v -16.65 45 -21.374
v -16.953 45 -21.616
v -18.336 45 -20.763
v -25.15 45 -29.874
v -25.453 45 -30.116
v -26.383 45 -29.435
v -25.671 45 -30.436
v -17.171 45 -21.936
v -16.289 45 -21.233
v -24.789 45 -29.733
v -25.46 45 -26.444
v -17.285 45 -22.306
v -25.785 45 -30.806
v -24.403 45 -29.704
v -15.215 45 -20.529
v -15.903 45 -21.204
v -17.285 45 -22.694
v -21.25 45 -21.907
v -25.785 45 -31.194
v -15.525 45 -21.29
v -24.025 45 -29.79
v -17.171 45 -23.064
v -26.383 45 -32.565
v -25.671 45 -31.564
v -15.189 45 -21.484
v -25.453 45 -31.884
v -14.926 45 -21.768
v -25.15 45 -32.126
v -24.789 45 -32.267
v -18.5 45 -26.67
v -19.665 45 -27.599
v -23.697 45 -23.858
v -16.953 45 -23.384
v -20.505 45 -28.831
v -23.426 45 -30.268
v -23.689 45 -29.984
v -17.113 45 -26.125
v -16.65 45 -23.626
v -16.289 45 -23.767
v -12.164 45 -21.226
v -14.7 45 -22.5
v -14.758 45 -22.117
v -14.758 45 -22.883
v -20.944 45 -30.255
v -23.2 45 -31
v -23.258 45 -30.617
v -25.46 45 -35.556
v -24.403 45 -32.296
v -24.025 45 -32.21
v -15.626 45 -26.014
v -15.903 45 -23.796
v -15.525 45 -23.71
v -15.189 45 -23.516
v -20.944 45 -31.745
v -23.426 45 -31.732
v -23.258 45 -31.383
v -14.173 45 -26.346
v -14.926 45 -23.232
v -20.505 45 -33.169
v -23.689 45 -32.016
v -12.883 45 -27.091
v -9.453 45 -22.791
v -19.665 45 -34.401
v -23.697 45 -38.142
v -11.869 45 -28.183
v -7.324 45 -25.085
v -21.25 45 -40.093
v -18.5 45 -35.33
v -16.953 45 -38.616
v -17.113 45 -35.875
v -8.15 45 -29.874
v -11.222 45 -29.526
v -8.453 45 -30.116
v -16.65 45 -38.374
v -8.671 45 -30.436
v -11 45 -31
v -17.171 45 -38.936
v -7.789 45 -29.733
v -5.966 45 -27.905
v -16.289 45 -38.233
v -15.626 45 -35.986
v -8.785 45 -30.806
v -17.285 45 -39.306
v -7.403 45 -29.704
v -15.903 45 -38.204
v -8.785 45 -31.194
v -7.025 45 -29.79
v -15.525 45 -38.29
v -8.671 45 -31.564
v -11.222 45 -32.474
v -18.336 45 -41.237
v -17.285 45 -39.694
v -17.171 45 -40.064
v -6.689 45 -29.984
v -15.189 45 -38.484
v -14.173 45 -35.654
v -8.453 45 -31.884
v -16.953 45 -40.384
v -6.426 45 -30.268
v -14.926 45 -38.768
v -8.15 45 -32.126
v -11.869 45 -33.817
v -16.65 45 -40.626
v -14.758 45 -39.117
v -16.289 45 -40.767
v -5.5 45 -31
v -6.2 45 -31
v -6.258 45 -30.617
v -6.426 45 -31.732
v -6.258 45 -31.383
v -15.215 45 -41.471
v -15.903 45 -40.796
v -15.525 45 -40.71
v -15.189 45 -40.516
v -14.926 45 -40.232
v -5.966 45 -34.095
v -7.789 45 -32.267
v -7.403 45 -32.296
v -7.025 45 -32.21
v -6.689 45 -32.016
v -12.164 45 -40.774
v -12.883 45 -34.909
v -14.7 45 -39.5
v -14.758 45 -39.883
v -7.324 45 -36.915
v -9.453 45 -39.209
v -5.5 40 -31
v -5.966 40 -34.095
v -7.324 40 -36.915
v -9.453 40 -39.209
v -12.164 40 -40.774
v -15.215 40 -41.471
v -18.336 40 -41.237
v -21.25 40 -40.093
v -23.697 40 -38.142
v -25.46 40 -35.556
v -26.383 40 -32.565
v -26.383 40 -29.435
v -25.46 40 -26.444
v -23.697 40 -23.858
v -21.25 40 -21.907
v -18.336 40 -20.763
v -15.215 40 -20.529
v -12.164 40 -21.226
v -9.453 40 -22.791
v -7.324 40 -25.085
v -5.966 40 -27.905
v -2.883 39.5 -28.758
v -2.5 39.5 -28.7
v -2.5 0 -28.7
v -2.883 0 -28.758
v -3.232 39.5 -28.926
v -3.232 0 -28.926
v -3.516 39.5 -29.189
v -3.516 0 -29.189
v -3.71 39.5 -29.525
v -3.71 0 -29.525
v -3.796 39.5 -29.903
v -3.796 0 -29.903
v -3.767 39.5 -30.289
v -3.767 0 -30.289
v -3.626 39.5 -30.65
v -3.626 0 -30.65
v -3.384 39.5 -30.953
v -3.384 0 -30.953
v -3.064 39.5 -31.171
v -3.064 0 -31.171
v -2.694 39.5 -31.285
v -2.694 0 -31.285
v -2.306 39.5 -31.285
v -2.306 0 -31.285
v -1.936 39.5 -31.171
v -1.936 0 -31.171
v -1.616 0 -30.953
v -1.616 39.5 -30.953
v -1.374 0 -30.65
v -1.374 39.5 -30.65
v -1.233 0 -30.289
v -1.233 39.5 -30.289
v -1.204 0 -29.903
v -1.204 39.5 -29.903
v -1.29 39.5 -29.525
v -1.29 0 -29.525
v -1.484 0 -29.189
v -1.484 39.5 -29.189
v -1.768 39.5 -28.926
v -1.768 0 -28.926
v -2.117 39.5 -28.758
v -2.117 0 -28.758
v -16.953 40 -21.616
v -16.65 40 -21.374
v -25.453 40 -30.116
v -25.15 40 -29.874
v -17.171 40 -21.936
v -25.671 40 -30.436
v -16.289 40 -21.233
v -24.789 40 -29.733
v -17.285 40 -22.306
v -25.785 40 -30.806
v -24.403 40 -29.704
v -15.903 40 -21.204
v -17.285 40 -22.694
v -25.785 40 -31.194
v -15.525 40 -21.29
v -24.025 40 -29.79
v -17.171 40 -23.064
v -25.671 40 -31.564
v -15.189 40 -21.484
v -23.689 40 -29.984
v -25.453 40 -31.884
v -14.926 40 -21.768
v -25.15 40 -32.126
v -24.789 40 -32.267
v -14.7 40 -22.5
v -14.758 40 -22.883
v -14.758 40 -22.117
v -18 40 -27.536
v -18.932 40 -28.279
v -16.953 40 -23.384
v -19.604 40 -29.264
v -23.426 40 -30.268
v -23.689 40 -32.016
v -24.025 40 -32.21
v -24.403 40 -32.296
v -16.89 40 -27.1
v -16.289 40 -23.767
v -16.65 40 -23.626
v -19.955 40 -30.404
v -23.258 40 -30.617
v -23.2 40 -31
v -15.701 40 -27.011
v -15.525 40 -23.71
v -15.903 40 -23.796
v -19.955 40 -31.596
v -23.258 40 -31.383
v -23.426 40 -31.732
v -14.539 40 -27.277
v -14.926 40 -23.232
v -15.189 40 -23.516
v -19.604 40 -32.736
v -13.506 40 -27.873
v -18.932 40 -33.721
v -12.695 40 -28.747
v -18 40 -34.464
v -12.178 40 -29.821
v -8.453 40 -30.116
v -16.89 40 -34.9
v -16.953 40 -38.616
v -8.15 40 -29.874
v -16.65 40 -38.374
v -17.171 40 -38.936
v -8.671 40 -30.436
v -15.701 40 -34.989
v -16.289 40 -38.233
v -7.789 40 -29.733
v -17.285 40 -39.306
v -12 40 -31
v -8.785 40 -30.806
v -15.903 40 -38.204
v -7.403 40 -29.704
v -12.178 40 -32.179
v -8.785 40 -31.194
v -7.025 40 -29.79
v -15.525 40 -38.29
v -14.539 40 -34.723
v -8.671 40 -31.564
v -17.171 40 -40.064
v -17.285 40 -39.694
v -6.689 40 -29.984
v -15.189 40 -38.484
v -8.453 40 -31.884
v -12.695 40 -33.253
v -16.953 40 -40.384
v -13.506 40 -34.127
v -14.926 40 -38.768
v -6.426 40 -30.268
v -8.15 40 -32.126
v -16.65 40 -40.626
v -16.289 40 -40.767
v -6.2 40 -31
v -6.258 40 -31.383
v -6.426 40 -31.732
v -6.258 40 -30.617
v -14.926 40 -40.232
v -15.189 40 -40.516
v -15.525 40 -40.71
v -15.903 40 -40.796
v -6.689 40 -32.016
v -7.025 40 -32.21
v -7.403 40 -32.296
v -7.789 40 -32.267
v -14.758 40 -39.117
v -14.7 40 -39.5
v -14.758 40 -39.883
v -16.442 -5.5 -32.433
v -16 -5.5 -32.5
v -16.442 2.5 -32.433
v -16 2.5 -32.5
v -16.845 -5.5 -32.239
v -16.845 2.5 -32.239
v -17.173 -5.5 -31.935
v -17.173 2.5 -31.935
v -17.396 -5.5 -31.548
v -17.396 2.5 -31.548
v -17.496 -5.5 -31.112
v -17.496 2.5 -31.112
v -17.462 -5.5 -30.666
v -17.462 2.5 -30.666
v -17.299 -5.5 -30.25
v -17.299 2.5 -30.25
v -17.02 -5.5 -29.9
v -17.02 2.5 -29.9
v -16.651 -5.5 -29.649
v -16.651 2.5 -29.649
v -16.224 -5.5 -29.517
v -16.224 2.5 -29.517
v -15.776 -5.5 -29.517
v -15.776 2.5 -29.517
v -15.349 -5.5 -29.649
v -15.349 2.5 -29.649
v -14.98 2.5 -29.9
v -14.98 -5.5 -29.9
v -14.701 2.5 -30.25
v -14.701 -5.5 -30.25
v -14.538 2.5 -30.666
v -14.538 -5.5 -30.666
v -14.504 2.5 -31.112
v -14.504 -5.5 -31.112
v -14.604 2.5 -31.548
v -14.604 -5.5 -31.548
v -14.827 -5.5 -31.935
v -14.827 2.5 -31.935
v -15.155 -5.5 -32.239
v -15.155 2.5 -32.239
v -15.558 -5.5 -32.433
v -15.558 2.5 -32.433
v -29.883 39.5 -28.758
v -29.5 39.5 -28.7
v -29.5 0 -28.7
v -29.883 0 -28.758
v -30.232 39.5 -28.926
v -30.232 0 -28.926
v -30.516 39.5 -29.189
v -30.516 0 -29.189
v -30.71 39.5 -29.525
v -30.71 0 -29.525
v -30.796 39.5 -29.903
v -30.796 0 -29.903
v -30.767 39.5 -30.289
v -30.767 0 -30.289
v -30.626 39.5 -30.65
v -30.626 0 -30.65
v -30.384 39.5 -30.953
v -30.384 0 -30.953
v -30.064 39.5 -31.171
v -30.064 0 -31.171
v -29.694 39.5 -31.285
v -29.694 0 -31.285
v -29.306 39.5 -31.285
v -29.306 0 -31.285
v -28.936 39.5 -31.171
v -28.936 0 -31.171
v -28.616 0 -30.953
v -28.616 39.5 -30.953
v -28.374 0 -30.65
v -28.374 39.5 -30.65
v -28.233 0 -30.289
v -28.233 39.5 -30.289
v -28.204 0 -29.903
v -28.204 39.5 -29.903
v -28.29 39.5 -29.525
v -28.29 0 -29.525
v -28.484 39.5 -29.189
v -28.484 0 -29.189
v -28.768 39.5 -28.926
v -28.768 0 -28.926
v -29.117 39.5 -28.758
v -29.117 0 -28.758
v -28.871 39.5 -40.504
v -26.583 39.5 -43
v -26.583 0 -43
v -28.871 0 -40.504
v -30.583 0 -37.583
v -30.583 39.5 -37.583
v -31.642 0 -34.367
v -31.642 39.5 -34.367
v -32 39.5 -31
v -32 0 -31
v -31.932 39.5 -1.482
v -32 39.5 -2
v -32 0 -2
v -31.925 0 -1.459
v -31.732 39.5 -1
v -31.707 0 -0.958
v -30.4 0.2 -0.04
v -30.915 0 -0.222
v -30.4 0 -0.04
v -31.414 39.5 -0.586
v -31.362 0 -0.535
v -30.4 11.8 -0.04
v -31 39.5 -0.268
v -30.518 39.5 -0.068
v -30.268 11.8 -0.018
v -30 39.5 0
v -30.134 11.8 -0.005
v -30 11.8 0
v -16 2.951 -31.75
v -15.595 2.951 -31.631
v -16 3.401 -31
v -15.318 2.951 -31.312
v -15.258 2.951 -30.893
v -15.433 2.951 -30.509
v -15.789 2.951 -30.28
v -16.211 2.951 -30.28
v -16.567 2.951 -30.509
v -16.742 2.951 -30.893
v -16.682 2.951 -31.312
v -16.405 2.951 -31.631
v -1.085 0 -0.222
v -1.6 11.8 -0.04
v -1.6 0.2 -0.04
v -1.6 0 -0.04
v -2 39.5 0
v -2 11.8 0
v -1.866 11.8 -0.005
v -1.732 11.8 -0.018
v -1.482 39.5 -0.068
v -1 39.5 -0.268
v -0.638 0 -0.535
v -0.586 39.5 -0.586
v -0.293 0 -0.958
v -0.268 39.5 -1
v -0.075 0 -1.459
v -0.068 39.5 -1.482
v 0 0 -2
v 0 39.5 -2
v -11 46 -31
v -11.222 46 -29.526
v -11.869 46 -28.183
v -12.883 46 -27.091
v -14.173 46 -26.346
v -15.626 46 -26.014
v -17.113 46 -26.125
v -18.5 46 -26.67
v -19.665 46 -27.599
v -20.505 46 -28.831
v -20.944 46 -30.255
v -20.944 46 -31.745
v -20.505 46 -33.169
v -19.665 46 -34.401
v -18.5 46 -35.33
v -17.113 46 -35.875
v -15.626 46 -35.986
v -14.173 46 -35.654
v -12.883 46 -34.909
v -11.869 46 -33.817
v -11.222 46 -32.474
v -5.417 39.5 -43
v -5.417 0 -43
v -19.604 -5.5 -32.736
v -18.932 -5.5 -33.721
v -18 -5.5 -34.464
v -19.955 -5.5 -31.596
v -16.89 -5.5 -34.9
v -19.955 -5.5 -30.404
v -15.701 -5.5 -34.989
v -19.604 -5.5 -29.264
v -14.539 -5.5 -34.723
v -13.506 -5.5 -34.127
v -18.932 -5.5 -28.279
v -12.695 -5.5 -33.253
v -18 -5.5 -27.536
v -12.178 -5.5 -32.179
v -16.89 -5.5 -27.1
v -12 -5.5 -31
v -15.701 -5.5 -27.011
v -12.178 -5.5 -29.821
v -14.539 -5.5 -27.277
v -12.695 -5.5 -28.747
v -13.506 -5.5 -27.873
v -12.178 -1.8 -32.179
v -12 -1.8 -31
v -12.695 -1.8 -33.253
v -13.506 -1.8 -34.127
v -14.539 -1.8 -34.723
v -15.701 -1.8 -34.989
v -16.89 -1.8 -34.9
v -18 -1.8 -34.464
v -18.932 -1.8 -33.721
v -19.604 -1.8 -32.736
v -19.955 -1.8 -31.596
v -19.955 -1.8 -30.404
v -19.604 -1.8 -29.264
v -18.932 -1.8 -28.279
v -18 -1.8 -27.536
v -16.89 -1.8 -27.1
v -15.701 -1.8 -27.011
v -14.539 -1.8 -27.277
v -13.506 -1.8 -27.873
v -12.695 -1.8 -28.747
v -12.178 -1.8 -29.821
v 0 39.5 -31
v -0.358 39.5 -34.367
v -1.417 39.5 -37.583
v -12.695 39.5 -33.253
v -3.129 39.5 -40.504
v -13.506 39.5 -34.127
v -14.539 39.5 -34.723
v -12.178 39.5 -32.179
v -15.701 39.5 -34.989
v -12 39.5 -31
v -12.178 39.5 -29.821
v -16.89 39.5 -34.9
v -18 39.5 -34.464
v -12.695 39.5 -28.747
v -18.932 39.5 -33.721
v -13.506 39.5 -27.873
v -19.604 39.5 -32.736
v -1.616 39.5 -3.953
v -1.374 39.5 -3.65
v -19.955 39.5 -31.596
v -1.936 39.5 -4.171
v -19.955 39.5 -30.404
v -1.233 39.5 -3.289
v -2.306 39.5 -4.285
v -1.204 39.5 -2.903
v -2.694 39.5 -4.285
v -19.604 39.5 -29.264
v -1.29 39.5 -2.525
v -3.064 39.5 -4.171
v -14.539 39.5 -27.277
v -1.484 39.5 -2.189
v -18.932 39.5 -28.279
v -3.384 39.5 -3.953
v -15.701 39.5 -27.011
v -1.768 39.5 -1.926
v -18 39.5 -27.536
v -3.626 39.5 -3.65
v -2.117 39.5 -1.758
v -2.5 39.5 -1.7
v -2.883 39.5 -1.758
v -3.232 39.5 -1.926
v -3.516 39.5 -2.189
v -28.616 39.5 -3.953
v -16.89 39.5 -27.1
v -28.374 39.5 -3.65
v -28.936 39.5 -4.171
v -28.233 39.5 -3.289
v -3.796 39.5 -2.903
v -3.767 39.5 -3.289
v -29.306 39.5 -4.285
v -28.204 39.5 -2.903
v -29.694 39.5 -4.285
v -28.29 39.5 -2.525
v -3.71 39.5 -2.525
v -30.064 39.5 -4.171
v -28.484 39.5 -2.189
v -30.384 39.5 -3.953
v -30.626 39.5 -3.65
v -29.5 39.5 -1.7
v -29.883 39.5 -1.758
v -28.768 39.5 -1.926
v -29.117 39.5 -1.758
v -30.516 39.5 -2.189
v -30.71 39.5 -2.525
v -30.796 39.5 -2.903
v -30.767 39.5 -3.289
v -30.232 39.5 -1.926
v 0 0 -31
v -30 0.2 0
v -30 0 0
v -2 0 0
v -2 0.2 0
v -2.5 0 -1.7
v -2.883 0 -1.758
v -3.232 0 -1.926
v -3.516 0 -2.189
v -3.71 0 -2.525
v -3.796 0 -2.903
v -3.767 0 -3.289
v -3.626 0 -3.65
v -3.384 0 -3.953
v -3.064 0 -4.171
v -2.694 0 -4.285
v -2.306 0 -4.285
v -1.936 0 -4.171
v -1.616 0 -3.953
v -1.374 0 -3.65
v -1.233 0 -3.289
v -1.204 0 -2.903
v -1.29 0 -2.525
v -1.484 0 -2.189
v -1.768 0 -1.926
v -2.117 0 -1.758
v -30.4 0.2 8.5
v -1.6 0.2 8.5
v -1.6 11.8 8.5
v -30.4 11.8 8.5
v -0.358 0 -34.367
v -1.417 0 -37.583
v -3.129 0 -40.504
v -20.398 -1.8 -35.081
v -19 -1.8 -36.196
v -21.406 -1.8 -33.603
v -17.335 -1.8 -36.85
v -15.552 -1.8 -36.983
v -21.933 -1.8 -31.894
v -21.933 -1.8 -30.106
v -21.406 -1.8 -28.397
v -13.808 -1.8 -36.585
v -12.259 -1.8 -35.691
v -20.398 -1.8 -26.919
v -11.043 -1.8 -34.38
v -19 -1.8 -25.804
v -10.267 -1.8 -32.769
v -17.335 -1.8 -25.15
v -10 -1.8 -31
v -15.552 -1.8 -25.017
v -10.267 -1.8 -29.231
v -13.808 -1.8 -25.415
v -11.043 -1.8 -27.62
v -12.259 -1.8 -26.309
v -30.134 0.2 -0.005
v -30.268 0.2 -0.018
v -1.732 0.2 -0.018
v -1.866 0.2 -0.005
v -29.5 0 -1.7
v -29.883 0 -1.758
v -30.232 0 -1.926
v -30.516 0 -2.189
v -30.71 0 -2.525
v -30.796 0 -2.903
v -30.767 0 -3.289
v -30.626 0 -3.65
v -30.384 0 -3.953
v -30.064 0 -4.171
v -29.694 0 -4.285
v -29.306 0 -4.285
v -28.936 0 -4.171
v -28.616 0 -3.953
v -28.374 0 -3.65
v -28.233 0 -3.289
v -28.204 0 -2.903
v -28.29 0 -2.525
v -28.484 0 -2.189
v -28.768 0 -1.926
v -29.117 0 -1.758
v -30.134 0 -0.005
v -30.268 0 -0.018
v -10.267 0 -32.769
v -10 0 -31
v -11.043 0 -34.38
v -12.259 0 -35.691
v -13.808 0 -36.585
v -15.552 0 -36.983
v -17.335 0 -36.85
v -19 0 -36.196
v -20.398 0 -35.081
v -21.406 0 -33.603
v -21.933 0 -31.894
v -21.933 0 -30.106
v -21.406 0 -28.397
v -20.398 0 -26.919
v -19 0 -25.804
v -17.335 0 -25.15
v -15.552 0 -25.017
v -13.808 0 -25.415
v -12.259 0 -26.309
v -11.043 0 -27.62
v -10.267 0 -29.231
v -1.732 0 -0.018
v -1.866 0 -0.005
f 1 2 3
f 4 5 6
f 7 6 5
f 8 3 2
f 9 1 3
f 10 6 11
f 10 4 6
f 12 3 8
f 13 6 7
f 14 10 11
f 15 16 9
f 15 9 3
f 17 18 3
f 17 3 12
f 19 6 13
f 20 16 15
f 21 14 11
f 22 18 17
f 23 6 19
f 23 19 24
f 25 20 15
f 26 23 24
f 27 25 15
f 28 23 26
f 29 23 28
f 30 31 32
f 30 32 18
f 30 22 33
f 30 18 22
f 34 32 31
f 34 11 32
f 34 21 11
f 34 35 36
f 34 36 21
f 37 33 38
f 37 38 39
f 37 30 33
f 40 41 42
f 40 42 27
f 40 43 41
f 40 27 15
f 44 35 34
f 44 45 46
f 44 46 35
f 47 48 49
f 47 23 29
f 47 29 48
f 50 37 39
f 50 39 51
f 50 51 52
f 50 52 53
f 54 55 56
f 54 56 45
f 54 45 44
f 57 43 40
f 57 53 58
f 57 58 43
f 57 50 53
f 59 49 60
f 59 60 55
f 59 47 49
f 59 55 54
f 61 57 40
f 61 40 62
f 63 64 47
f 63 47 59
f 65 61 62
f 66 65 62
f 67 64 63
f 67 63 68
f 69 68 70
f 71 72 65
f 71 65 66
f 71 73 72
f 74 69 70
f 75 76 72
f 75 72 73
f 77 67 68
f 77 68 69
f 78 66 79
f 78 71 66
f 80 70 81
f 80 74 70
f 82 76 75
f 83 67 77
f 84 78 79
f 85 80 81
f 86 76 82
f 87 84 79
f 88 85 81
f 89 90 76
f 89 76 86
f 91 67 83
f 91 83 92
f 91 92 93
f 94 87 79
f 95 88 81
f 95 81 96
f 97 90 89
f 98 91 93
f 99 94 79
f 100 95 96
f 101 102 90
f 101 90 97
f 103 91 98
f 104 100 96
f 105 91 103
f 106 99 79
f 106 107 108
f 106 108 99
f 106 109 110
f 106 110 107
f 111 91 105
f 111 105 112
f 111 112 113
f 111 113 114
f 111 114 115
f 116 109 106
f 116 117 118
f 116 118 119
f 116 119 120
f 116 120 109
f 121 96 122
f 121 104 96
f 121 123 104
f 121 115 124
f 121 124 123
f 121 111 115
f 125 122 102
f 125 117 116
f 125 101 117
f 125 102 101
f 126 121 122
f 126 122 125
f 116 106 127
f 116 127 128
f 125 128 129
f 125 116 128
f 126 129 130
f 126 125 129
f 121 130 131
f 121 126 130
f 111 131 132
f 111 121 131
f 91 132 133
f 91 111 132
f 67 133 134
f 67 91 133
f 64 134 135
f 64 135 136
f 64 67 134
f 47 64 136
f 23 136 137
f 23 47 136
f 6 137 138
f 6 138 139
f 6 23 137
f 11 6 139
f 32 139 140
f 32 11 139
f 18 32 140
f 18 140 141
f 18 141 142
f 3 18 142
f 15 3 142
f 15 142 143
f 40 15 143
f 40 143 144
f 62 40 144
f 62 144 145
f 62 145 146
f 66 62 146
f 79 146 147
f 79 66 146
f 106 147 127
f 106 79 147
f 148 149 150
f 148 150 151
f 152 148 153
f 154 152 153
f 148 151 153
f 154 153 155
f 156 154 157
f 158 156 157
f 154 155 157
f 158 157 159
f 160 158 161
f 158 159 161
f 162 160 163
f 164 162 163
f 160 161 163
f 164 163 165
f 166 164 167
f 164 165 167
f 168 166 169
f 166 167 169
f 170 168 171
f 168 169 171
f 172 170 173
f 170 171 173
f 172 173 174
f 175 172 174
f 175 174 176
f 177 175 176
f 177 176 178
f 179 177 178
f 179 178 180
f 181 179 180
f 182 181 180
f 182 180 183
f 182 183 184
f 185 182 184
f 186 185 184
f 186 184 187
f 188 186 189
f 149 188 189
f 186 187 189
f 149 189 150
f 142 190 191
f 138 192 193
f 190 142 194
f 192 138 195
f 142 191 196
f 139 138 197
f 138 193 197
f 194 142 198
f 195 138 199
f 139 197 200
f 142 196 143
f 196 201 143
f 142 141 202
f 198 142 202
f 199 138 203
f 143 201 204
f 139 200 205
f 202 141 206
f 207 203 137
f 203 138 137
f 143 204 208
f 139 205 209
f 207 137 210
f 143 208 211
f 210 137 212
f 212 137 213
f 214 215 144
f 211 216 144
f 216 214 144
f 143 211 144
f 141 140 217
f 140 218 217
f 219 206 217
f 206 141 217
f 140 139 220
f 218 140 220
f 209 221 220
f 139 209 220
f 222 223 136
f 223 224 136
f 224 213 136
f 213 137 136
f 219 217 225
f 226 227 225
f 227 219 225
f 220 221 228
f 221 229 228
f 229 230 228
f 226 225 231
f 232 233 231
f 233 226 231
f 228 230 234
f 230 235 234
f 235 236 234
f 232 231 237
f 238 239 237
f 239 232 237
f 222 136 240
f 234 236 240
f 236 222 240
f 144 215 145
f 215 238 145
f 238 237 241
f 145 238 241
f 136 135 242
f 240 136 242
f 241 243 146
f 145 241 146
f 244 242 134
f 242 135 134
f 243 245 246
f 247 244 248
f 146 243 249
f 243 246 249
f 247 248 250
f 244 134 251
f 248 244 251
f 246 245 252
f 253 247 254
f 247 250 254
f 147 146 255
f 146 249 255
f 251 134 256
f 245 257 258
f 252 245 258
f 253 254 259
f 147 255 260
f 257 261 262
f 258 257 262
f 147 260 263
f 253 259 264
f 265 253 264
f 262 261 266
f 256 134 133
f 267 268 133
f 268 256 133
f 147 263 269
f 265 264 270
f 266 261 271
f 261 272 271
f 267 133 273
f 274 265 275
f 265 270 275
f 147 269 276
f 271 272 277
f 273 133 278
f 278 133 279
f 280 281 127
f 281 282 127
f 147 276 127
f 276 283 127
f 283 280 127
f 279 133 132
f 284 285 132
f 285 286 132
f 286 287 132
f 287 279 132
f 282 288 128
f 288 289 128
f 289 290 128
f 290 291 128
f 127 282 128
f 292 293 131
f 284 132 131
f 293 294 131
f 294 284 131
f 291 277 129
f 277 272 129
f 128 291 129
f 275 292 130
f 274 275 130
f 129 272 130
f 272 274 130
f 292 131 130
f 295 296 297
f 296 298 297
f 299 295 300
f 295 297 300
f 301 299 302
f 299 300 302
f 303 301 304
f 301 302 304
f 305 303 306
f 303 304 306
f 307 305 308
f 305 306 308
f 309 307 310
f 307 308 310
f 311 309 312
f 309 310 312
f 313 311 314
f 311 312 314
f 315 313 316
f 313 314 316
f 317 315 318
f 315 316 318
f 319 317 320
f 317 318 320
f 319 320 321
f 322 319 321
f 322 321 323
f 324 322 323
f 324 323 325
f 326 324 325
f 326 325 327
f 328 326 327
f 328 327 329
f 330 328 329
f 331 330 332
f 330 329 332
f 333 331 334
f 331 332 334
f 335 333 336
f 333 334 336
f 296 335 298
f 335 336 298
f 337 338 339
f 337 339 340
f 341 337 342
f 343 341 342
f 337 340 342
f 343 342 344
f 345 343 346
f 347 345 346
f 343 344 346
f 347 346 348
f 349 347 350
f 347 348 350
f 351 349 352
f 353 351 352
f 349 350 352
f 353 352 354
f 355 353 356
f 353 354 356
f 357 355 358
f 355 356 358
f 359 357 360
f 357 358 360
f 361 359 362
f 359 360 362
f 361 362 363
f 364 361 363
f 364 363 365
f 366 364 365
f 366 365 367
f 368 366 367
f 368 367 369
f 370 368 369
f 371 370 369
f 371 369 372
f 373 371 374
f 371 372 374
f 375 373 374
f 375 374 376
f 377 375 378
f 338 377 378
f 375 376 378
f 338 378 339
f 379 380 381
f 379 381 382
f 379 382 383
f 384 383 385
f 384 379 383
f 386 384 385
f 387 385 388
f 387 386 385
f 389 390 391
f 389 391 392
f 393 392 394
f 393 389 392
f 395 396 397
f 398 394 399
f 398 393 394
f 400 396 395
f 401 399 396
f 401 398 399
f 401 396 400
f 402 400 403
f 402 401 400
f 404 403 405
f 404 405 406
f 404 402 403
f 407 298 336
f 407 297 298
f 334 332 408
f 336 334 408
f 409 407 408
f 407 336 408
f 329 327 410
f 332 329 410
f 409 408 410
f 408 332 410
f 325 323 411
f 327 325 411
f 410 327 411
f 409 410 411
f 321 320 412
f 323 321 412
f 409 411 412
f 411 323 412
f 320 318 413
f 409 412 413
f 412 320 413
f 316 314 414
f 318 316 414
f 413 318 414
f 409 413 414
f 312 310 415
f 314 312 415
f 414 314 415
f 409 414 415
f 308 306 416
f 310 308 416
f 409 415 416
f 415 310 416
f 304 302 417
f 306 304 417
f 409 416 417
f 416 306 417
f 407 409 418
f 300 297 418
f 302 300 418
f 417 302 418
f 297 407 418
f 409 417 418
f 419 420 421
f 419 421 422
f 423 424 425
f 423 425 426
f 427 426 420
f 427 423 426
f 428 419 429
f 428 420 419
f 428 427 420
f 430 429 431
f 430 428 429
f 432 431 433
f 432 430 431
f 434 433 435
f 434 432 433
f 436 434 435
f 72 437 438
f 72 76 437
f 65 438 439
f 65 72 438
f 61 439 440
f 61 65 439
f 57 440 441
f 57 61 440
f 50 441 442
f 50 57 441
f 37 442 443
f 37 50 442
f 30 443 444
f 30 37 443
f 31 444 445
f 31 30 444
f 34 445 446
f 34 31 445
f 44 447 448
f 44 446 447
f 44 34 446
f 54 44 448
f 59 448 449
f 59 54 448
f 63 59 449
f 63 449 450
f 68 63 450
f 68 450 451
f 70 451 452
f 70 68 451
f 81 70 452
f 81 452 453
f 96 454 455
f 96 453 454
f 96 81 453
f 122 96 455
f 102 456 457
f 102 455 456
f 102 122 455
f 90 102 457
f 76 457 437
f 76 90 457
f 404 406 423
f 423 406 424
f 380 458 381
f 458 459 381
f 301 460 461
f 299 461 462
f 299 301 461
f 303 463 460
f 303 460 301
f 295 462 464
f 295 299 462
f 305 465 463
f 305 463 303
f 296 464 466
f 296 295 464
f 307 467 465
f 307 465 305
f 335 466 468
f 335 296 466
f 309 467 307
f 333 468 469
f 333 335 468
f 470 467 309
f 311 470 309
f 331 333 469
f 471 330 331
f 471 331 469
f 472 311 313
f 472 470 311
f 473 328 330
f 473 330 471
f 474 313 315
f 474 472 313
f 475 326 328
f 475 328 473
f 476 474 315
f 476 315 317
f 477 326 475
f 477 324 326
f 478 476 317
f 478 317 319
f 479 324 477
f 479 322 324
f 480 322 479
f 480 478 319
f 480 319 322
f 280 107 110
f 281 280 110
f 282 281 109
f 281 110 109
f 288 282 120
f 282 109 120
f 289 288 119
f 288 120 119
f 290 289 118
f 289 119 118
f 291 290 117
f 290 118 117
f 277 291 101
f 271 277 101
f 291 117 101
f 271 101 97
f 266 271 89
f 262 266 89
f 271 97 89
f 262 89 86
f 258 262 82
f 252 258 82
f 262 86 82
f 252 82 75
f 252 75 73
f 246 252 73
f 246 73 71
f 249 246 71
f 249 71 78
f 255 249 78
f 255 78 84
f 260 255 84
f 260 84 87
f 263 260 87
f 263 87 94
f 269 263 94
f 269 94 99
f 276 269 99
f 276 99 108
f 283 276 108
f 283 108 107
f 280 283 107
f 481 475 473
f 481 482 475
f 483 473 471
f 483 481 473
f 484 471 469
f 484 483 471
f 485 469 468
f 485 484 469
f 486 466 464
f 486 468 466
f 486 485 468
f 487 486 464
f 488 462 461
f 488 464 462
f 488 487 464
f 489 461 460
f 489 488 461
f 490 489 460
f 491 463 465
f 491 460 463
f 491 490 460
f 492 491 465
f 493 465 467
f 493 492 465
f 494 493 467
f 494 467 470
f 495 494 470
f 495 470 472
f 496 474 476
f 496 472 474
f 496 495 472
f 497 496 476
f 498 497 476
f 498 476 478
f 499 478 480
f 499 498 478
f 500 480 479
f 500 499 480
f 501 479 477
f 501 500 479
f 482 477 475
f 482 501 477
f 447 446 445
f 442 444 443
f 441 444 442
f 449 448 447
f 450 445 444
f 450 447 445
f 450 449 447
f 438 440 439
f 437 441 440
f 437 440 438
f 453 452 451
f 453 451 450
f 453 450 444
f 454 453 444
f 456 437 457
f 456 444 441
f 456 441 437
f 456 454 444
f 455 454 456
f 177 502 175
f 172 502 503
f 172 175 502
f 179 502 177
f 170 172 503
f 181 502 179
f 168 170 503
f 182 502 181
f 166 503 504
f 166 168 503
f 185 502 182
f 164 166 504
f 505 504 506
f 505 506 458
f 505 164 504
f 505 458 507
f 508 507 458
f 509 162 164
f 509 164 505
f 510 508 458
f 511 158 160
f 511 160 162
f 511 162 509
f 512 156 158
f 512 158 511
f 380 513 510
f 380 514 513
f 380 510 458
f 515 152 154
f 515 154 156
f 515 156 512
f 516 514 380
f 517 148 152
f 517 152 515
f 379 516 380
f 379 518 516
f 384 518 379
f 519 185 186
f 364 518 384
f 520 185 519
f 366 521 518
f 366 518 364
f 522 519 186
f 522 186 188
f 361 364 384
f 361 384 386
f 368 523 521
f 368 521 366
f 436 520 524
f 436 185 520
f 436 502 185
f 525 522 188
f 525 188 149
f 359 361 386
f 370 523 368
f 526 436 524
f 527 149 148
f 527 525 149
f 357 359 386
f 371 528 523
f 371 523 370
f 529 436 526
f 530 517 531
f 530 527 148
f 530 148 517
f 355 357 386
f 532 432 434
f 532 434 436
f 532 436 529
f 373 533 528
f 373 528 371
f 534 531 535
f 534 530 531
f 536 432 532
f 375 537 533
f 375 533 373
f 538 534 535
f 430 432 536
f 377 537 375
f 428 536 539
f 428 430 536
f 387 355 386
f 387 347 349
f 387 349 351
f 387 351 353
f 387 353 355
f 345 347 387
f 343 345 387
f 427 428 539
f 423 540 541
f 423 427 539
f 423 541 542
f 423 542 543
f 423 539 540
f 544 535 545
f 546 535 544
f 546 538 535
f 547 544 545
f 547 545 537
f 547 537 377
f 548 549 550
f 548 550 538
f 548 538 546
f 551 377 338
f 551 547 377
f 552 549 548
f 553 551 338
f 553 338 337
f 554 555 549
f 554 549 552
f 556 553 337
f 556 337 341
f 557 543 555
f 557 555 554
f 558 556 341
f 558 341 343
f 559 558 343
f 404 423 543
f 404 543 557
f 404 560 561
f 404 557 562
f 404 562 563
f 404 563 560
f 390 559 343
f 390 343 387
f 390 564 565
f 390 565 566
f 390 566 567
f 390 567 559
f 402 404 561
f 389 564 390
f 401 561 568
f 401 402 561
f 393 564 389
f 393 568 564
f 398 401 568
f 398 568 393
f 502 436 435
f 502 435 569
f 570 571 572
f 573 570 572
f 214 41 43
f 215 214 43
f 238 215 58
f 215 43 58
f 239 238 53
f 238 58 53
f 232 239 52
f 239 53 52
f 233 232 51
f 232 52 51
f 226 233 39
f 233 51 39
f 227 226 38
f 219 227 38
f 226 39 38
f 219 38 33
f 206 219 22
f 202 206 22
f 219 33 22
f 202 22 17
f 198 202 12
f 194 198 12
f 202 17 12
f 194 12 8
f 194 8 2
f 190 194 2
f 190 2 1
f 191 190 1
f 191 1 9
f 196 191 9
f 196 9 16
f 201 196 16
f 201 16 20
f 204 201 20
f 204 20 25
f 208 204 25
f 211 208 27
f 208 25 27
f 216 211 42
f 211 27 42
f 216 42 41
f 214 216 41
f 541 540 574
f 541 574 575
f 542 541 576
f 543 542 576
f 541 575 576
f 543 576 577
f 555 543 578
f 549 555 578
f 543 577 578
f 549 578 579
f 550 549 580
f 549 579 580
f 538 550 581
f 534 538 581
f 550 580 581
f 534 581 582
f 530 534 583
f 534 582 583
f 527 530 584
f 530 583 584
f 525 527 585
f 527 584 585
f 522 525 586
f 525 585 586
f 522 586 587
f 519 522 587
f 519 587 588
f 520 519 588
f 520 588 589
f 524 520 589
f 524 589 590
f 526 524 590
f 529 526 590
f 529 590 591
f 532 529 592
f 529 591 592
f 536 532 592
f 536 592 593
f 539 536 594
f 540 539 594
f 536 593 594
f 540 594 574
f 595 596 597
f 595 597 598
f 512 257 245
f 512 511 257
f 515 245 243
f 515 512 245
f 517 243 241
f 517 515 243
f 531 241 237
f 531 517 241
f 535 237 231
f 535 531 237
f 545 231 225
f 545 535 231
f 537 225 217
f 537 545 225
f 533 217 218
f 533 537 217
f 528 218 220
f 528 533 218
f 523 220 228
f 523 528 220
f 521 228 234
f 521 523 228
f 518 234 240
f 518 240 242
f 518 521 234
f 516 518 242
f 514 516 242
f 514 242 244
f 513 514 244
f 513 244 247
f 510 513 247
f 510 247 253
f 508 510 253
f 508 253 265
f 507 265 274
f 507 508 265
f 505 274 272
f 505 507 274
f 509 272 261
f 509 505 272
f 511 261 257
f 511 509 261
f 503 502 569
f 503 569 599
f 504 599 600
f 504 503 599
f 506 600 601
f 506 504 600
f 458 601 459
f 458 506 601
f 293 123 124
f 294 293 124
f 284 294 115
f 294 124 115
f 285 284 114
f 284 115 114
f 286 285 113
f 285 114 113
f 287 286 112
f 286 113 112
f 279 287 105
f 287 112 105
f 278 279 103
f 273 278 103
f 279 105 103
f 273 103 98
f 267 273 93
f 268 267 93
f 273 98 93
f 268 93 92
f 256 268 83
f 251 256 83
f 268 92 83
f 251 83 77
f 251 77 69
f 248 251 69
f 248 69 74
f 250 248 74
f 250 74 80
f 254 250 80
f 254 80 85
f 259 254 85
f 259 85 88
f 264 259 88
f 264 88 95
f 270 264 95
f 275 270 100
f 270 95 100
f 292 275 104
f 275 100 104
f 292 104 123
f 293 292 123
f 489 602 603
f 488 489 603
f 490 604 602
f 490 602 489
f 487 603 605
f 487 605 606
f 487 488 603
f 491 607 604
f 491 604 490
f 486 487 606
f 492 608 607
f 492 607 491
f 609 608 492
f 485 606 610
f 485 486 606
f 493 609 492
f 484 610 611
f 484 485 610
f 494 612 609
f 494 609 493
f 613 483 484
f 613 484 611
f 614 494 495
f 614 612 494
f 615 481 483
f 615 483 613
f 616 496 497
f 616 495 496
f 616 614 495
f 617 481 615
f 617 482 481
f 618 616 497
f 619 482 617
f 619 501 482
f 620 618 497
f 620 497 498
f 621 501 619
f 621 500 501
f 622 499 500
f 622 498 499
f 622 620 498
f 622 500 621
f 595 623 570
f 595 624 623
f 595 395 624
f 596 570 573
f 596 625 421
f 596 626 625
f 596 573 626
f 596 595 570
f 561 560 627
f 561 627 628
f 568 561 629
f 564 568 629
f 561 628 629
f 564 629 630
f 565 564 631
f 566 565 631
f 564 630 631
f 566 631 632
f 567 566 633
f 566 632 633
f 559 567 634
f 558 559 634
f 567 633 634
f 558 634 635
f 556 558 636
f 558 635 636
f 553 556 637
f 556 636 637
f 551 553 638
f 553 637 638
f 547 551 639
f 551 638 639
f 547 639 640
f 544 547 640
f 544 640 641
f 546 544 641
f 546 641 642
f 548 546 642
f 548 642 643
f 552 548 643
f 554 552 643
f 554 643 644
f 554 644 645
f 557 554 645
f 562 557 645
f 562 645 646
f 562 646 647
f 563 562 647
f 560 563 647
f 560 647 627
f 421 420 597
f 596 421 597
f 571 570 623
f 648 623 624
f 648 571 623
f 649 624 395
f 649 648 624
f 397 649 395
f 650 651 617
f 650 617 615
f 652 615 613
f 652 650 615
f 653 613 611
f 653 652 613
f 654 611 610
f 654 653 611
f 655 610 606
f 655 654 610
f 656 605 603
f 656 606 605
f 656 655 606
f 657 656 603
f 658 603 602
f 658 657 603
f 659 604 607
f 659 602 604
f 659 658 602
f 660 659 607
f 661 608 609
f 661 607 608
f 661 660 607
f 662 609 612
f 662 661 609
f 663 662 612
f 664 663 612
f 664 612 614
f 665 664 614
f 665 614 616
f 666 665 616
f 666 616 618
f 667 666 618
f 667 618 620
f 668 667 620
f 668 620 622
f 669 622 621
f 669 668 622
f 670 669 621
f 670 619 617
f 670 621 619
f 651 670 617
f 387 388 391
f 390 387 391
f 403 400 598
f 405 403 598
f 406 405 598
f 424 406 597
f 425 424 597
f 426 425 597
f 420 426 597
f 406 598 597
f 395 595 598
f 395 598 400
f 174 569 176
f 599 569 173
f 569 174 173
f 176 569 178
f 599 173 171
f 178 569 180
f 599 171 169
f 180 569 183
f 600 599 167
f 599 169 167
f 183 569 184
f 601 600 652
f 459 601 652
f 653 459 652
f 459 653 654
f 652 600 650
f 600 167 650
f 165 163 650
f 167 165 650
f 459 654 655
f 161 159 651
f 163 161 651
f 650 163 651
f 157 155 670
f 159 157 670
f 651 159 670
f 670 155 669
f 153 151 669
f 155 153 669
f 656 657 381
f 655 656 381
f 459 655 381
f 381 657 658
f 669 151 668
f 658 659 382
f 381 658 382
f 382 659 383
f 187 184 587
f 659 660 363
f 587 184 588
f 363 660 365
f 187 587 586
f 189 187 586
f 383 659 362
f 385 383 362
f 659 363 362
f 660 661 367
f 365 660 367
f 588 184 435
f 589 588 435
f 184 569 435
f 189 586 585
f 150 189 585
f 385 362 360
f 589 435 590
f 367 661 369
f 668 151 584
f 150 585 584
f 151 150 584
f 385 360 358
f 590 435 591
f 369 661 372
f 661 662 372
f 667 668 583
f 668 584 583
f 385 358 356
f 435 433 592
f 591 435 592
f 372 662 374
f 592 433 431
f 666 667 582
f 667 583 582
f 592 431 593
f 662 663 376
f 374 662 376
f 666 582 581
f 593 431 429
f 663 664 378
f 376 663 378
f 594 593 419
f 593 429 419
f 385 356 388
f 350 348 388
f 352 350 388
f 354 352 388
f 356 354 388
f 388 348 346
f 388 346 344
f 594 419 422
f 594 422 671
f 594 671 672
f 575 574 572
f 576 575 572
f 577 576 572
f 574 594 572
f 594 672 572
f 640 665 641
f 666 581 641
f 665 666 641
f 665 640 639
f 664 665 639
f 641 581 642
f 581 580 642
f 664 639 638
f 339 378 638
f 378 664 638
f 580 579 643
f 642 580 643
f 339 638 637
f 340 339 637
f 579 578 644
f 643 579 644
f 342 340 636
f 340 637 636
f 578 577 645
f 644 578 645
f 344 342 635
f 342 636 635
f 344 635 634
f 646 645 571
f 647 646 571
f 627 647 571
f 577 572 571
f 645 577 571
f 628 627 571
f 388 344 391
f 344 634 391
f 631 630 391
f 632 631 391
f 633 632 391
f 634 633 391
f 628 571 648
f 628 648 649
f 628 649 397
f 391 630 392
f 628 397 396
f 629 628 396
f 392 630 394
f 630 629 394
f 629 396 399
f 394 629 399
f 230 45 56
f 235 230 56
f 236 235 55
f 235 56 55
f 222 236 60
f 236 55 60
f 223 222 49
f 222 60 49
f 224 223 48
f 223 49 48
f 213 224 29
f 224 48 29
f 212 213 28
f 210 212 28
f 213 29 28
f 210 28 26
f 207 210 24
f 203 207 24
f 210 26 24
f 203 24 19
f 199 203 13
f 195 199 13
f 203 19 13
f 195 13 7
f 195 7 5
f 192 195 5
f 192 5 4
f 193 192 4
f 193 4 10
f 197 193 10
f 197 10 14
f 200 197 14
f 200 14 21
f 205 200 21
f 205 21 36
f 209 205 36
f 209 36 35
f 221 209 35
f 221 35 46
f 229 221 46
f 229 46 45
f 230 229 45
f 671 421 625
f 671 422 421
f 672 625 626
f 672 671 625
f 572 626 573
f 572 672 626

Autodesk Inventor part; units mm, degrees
ref_plane "YZ Plane" through (0, 0, 0) normal (1, 0, 0) x (0, 1, 0)
ref_plane "XZ Plane" through (0, 0, 0) normal (0, 1, 0) x (-1, 0, 0)
ref_plane "XY Plane" through (0, 0, 0) normal (0, 0, 1) x (1, 0, 0)
sketch "スケッチ1" plane through (0, 0, 0) normal (0, 1, 0) x (-1, 0, 0)
  line L0 (0, 0) -> (0, -43)
  line L1 (0, -43) -> (32, -43)
  line L2 (32, -43) -> (32, 0)
  line L3 (32, 0) -> (0, 0)
  dimension "d0" = 43
  dimension "d1" = 32
extrude "押し出し1" add sketch "スケッチ1" along normal blind 39.5
fillet "フィレット1" radius 2 2 edges at (-32, 19.75, 0) (0, 19.75, 0)
sketch "スケッチ2" plane through (0, 39.5, 0) normal (0, 1, 0) x (1, 0, 0)
  line L0 (0, 43) -> (-32, 43) projected
  line L1 (-16, 43) -> (-16, 0)
  line L2 (-30, 0) -> (-2, 0) projected
  line L3 (-16, 21.5) -> (-16, 3)
  line L4 (-16, 3) -> (-2.5, 3)
  line L5 (0, 2) -> (0, 43) projected
  line L6 (-16, 3) -> (-29.5, 3)
  line L7 (-29.5, 3) -> (-29.5, 30)
  point P0 (0, 0)
  point P1 (-2.5, 30)
  dimension "d5" = 18.5
  dimension "d6" = 13.5
  dimension "d7" = 13.5
  dimension "d8" = 27
hole "穴1" at (-2.5, 39.5, -3) at (-29.5, 39.5, -3) at (-29.5, 39.5, -30) at (-2.5, 39.5, -30) direction (0, -1, 0) diameter 2.6 end through all
sketch "スケッチ3" plane through (0, 39.5, 0) normal (0, 1, 0) x (1, 0, 0)
  line L0 (0, 43) -> (-32, 43) projected
  line L1 (-16, 43) -> (-16, 0)
  line L2 (-16, 21.5) -> (-16, 31)
  line L3 (-32, 43) -> (-32, 2) projected
  line L4 (-32, 31) -> (-32, 43)
  line L5 (-32, 43) -> (-26.583, 43)
  line L6 (0, 2) -> (0, 43) projected
  line L7 (0, 31) -> (0, 43)
  line L8 (0, 43) -> (-5.417, 43)
  arc A0 (-26.583, 43) -> (-32, 31) centre (-16, 31) ccw
  arc A1 (0, 31) -> (-5.417, 43) centre (-16, 31) ccw
  point P0 (0, 0)
  dimension "d16" = 9.5
extrude "押し出し2" cut sketch "スケッチ3" against normal blind 39.5
sketch "スケッチ4" plane through (0, 39.5, 0) normal (0, 1, 0) x (1, 0, 0)
  arc A0 (-26.583, 43) -> (-32, 31) centre (-16, 31) ccw projected
  circle A1 centre (-16, 31) radius 4
  point P0 (0, 0)
  dimension "d20" = 8
extrude "押し出し3" add sketch "スケッチ4" along normal blind 5
sketch "スケッチ5" plane through (0, 0, 0) normal (0, -1, 0) x (1, 0, 0)
  circle A0 centre (-16, -31) radius 4 projected
  circle A1 centre (-16, -31) radius 4
  point P0 (0, 0)
extrude "押し出し4" add sketch "スケッチ5" along normal blind 5.5
sketch "スケッチ6" plane through (0, 0, 0) normal (0, -1, 0) x (1, 0, 0)
  line L0 (-30, 0) -> (-2, 0) projected
  line L1 (-16, 0) -> (-1.6, 0)
  line L2 (-1.6, 0) -> (-1.6, 8.5)
  line L3 (-1.6, 0) -> (6.9, 0) construction
  line L4 (-1.6, 8.5) -> (-30.4, 8.5)
  line L5 (-30.4, 8.5) -> (-30.4, -0.1236)
  line L6 (-30.4, -0.1236) -> (-1.6, -0.1236)
  line L7 (-1.6, -0.1236) -> (-1.6, 0)
  point P0 (0, 0)
  dimension "d25" = 14.4
  dimension "d26" = 8.5
  dimension "d27" = 90
  dimension "d28" = 28.8
extrude "押し出し5" add sketch "スケッチ6" against normal blind 11.8
sketch "スケッチ7" plane through (0, 0, 0) normal (0, -1, 0) x (1, 0, 0)
  arc A0 (0, -2) -> (-2, 0) centre (-2, -2) ccw projected
  arc A1 (-1.6, -0.0404) -> (-2, 0) centre (-2, -2) ccw
  arc A2 (-30.4, -0.0404) -> (-32, -2) centre (-30, -2) ccw projected
  arc A3 (-30, 0) -> (-30.4, -0.0404) centre (-30, -2) ccw
  line L0 (-1.6, -0.0404) -> (-1.6, 8.5)
  line L1 (-1.6, 8.5) -> (-30.4, 8.5)
  line L2 (-30.4, 8.5) -> (-1.6, 8.5) projected
  line L3 (-30.4, 8.5) -> (-30.4, -0.0404)
  line L4 (-30, 0) -> (-2, 0)
  arc A4 (-30, 0) -> (-30.4, -0.0404) centre (-30, -2) ccw projected
  point P0 (0, 0)
extrude "押し出し6" cut sketch "スケッチ7" against normal blind 0.2
thread "ねじ1" size "M2.6x0.45" class "6H" standard "ANSI Metric M Profile" full length
thread "ねじ2" size "M2.6x0.45" class "6H" standard "ANSI Metric M Profile" full length
thread "ねじ3" size "M2.6x0.45" class "6H" standard "ANSI Metric M Profile" full length
thread "ねじ4" size "M2.6x0.45" class "6H" standard "ANSI Metric M Profile" full length
sketch "スケッチ12" plane through (-16, 45, -31) normal (0, 1, 0) x (1, 0, 0)
  circle A0 centre (0, 0) radius 10.5
  point P0 (16, -31)
  dimension "d66" = 21
extrude "押し出し9" add sketch "スケッチ12" against normal blind 5
sketch "スケッチ13" plane through (-16, 45, -31) normal (0, 1, 0) x (1, 0, 0)
  circle A0 centre (0, 0) radius 5
  point P0 (16, -31)
  dimension "d69" = 10
extrude "押し出し10" add sketch "スケッチ13" along normal blind 1
sketch "スケッチ14" plane through (-16, 45, -31) normal (0, 1, 0) x (1, 0, 0)
  circle A0 centre (0, 0) radius 8.5
  circle A1 centre (0, 8.5) radius 1.3
  circle A2 centre (-8.5, 0) radius 1.3
  circle A3 centre (8.5, 0) radius 1.3
  circle A4 centre (0, -8.5) radius 1.3
  point P0 (16, -31)
  dimension "d72" = 17
  dimension "d73" = 2.6
  dimension "d74" = 2.6
  dimension "d75" = 2.6
  dimension "d76" = 2.6
extrude "押し出し11" cut sketch "スケッチ14" against normal blind 5 contours A0 A3 | A0 A3 | A1 A0 | A0 A1 | A4 A0 | A0 A4 | A2 A0 | A0 A2
thread "ねじ9" size "M2.6x0.45" class "6H" standard "ANSI Metric M Profile" full length
thread "ねじ10" size "M2.6x0.45" class "6H" standard "ANSI Metric M Profile" full length
thread "ねじ11" size "M2.6x0.45" class "6H" standard "ANSI Metric M Profile" full length
thread "ねじ12" size "M2.6x0.45" class "6H" standard "ANSI Metric M Profile" full length
sketch "スケッチ15" plane through (0, 0, 0) normal (0, -1, 0) x (1, 0, 0)
  circle A0 centre (-16, -31) radius 4 projected
  circle A1 centre (-16, -31) radius 6
  point P0 (0, 0)
  dimension "d87" = 12
extrude "押し出し12" add sketch "スケッチ15" along normal blind 1.8
sketch "スケッチ16" plane through (-16, -5.5, -31) normal (0, -1, 0) x (1, 0, 0)
  point P0 (16, 31)
  point P1 (0, 0)
hole "穴3" at (-16, -5.5, -31) direction (0, 1, 0) diameter 3 depth 8 tip angle 118
thread "ねじ13" size "M3x0.5" class "6H" standard "ANSI Metric M Profile" full length
properties part number "B3M11xx" material "アルミニウム 2014-T4"
